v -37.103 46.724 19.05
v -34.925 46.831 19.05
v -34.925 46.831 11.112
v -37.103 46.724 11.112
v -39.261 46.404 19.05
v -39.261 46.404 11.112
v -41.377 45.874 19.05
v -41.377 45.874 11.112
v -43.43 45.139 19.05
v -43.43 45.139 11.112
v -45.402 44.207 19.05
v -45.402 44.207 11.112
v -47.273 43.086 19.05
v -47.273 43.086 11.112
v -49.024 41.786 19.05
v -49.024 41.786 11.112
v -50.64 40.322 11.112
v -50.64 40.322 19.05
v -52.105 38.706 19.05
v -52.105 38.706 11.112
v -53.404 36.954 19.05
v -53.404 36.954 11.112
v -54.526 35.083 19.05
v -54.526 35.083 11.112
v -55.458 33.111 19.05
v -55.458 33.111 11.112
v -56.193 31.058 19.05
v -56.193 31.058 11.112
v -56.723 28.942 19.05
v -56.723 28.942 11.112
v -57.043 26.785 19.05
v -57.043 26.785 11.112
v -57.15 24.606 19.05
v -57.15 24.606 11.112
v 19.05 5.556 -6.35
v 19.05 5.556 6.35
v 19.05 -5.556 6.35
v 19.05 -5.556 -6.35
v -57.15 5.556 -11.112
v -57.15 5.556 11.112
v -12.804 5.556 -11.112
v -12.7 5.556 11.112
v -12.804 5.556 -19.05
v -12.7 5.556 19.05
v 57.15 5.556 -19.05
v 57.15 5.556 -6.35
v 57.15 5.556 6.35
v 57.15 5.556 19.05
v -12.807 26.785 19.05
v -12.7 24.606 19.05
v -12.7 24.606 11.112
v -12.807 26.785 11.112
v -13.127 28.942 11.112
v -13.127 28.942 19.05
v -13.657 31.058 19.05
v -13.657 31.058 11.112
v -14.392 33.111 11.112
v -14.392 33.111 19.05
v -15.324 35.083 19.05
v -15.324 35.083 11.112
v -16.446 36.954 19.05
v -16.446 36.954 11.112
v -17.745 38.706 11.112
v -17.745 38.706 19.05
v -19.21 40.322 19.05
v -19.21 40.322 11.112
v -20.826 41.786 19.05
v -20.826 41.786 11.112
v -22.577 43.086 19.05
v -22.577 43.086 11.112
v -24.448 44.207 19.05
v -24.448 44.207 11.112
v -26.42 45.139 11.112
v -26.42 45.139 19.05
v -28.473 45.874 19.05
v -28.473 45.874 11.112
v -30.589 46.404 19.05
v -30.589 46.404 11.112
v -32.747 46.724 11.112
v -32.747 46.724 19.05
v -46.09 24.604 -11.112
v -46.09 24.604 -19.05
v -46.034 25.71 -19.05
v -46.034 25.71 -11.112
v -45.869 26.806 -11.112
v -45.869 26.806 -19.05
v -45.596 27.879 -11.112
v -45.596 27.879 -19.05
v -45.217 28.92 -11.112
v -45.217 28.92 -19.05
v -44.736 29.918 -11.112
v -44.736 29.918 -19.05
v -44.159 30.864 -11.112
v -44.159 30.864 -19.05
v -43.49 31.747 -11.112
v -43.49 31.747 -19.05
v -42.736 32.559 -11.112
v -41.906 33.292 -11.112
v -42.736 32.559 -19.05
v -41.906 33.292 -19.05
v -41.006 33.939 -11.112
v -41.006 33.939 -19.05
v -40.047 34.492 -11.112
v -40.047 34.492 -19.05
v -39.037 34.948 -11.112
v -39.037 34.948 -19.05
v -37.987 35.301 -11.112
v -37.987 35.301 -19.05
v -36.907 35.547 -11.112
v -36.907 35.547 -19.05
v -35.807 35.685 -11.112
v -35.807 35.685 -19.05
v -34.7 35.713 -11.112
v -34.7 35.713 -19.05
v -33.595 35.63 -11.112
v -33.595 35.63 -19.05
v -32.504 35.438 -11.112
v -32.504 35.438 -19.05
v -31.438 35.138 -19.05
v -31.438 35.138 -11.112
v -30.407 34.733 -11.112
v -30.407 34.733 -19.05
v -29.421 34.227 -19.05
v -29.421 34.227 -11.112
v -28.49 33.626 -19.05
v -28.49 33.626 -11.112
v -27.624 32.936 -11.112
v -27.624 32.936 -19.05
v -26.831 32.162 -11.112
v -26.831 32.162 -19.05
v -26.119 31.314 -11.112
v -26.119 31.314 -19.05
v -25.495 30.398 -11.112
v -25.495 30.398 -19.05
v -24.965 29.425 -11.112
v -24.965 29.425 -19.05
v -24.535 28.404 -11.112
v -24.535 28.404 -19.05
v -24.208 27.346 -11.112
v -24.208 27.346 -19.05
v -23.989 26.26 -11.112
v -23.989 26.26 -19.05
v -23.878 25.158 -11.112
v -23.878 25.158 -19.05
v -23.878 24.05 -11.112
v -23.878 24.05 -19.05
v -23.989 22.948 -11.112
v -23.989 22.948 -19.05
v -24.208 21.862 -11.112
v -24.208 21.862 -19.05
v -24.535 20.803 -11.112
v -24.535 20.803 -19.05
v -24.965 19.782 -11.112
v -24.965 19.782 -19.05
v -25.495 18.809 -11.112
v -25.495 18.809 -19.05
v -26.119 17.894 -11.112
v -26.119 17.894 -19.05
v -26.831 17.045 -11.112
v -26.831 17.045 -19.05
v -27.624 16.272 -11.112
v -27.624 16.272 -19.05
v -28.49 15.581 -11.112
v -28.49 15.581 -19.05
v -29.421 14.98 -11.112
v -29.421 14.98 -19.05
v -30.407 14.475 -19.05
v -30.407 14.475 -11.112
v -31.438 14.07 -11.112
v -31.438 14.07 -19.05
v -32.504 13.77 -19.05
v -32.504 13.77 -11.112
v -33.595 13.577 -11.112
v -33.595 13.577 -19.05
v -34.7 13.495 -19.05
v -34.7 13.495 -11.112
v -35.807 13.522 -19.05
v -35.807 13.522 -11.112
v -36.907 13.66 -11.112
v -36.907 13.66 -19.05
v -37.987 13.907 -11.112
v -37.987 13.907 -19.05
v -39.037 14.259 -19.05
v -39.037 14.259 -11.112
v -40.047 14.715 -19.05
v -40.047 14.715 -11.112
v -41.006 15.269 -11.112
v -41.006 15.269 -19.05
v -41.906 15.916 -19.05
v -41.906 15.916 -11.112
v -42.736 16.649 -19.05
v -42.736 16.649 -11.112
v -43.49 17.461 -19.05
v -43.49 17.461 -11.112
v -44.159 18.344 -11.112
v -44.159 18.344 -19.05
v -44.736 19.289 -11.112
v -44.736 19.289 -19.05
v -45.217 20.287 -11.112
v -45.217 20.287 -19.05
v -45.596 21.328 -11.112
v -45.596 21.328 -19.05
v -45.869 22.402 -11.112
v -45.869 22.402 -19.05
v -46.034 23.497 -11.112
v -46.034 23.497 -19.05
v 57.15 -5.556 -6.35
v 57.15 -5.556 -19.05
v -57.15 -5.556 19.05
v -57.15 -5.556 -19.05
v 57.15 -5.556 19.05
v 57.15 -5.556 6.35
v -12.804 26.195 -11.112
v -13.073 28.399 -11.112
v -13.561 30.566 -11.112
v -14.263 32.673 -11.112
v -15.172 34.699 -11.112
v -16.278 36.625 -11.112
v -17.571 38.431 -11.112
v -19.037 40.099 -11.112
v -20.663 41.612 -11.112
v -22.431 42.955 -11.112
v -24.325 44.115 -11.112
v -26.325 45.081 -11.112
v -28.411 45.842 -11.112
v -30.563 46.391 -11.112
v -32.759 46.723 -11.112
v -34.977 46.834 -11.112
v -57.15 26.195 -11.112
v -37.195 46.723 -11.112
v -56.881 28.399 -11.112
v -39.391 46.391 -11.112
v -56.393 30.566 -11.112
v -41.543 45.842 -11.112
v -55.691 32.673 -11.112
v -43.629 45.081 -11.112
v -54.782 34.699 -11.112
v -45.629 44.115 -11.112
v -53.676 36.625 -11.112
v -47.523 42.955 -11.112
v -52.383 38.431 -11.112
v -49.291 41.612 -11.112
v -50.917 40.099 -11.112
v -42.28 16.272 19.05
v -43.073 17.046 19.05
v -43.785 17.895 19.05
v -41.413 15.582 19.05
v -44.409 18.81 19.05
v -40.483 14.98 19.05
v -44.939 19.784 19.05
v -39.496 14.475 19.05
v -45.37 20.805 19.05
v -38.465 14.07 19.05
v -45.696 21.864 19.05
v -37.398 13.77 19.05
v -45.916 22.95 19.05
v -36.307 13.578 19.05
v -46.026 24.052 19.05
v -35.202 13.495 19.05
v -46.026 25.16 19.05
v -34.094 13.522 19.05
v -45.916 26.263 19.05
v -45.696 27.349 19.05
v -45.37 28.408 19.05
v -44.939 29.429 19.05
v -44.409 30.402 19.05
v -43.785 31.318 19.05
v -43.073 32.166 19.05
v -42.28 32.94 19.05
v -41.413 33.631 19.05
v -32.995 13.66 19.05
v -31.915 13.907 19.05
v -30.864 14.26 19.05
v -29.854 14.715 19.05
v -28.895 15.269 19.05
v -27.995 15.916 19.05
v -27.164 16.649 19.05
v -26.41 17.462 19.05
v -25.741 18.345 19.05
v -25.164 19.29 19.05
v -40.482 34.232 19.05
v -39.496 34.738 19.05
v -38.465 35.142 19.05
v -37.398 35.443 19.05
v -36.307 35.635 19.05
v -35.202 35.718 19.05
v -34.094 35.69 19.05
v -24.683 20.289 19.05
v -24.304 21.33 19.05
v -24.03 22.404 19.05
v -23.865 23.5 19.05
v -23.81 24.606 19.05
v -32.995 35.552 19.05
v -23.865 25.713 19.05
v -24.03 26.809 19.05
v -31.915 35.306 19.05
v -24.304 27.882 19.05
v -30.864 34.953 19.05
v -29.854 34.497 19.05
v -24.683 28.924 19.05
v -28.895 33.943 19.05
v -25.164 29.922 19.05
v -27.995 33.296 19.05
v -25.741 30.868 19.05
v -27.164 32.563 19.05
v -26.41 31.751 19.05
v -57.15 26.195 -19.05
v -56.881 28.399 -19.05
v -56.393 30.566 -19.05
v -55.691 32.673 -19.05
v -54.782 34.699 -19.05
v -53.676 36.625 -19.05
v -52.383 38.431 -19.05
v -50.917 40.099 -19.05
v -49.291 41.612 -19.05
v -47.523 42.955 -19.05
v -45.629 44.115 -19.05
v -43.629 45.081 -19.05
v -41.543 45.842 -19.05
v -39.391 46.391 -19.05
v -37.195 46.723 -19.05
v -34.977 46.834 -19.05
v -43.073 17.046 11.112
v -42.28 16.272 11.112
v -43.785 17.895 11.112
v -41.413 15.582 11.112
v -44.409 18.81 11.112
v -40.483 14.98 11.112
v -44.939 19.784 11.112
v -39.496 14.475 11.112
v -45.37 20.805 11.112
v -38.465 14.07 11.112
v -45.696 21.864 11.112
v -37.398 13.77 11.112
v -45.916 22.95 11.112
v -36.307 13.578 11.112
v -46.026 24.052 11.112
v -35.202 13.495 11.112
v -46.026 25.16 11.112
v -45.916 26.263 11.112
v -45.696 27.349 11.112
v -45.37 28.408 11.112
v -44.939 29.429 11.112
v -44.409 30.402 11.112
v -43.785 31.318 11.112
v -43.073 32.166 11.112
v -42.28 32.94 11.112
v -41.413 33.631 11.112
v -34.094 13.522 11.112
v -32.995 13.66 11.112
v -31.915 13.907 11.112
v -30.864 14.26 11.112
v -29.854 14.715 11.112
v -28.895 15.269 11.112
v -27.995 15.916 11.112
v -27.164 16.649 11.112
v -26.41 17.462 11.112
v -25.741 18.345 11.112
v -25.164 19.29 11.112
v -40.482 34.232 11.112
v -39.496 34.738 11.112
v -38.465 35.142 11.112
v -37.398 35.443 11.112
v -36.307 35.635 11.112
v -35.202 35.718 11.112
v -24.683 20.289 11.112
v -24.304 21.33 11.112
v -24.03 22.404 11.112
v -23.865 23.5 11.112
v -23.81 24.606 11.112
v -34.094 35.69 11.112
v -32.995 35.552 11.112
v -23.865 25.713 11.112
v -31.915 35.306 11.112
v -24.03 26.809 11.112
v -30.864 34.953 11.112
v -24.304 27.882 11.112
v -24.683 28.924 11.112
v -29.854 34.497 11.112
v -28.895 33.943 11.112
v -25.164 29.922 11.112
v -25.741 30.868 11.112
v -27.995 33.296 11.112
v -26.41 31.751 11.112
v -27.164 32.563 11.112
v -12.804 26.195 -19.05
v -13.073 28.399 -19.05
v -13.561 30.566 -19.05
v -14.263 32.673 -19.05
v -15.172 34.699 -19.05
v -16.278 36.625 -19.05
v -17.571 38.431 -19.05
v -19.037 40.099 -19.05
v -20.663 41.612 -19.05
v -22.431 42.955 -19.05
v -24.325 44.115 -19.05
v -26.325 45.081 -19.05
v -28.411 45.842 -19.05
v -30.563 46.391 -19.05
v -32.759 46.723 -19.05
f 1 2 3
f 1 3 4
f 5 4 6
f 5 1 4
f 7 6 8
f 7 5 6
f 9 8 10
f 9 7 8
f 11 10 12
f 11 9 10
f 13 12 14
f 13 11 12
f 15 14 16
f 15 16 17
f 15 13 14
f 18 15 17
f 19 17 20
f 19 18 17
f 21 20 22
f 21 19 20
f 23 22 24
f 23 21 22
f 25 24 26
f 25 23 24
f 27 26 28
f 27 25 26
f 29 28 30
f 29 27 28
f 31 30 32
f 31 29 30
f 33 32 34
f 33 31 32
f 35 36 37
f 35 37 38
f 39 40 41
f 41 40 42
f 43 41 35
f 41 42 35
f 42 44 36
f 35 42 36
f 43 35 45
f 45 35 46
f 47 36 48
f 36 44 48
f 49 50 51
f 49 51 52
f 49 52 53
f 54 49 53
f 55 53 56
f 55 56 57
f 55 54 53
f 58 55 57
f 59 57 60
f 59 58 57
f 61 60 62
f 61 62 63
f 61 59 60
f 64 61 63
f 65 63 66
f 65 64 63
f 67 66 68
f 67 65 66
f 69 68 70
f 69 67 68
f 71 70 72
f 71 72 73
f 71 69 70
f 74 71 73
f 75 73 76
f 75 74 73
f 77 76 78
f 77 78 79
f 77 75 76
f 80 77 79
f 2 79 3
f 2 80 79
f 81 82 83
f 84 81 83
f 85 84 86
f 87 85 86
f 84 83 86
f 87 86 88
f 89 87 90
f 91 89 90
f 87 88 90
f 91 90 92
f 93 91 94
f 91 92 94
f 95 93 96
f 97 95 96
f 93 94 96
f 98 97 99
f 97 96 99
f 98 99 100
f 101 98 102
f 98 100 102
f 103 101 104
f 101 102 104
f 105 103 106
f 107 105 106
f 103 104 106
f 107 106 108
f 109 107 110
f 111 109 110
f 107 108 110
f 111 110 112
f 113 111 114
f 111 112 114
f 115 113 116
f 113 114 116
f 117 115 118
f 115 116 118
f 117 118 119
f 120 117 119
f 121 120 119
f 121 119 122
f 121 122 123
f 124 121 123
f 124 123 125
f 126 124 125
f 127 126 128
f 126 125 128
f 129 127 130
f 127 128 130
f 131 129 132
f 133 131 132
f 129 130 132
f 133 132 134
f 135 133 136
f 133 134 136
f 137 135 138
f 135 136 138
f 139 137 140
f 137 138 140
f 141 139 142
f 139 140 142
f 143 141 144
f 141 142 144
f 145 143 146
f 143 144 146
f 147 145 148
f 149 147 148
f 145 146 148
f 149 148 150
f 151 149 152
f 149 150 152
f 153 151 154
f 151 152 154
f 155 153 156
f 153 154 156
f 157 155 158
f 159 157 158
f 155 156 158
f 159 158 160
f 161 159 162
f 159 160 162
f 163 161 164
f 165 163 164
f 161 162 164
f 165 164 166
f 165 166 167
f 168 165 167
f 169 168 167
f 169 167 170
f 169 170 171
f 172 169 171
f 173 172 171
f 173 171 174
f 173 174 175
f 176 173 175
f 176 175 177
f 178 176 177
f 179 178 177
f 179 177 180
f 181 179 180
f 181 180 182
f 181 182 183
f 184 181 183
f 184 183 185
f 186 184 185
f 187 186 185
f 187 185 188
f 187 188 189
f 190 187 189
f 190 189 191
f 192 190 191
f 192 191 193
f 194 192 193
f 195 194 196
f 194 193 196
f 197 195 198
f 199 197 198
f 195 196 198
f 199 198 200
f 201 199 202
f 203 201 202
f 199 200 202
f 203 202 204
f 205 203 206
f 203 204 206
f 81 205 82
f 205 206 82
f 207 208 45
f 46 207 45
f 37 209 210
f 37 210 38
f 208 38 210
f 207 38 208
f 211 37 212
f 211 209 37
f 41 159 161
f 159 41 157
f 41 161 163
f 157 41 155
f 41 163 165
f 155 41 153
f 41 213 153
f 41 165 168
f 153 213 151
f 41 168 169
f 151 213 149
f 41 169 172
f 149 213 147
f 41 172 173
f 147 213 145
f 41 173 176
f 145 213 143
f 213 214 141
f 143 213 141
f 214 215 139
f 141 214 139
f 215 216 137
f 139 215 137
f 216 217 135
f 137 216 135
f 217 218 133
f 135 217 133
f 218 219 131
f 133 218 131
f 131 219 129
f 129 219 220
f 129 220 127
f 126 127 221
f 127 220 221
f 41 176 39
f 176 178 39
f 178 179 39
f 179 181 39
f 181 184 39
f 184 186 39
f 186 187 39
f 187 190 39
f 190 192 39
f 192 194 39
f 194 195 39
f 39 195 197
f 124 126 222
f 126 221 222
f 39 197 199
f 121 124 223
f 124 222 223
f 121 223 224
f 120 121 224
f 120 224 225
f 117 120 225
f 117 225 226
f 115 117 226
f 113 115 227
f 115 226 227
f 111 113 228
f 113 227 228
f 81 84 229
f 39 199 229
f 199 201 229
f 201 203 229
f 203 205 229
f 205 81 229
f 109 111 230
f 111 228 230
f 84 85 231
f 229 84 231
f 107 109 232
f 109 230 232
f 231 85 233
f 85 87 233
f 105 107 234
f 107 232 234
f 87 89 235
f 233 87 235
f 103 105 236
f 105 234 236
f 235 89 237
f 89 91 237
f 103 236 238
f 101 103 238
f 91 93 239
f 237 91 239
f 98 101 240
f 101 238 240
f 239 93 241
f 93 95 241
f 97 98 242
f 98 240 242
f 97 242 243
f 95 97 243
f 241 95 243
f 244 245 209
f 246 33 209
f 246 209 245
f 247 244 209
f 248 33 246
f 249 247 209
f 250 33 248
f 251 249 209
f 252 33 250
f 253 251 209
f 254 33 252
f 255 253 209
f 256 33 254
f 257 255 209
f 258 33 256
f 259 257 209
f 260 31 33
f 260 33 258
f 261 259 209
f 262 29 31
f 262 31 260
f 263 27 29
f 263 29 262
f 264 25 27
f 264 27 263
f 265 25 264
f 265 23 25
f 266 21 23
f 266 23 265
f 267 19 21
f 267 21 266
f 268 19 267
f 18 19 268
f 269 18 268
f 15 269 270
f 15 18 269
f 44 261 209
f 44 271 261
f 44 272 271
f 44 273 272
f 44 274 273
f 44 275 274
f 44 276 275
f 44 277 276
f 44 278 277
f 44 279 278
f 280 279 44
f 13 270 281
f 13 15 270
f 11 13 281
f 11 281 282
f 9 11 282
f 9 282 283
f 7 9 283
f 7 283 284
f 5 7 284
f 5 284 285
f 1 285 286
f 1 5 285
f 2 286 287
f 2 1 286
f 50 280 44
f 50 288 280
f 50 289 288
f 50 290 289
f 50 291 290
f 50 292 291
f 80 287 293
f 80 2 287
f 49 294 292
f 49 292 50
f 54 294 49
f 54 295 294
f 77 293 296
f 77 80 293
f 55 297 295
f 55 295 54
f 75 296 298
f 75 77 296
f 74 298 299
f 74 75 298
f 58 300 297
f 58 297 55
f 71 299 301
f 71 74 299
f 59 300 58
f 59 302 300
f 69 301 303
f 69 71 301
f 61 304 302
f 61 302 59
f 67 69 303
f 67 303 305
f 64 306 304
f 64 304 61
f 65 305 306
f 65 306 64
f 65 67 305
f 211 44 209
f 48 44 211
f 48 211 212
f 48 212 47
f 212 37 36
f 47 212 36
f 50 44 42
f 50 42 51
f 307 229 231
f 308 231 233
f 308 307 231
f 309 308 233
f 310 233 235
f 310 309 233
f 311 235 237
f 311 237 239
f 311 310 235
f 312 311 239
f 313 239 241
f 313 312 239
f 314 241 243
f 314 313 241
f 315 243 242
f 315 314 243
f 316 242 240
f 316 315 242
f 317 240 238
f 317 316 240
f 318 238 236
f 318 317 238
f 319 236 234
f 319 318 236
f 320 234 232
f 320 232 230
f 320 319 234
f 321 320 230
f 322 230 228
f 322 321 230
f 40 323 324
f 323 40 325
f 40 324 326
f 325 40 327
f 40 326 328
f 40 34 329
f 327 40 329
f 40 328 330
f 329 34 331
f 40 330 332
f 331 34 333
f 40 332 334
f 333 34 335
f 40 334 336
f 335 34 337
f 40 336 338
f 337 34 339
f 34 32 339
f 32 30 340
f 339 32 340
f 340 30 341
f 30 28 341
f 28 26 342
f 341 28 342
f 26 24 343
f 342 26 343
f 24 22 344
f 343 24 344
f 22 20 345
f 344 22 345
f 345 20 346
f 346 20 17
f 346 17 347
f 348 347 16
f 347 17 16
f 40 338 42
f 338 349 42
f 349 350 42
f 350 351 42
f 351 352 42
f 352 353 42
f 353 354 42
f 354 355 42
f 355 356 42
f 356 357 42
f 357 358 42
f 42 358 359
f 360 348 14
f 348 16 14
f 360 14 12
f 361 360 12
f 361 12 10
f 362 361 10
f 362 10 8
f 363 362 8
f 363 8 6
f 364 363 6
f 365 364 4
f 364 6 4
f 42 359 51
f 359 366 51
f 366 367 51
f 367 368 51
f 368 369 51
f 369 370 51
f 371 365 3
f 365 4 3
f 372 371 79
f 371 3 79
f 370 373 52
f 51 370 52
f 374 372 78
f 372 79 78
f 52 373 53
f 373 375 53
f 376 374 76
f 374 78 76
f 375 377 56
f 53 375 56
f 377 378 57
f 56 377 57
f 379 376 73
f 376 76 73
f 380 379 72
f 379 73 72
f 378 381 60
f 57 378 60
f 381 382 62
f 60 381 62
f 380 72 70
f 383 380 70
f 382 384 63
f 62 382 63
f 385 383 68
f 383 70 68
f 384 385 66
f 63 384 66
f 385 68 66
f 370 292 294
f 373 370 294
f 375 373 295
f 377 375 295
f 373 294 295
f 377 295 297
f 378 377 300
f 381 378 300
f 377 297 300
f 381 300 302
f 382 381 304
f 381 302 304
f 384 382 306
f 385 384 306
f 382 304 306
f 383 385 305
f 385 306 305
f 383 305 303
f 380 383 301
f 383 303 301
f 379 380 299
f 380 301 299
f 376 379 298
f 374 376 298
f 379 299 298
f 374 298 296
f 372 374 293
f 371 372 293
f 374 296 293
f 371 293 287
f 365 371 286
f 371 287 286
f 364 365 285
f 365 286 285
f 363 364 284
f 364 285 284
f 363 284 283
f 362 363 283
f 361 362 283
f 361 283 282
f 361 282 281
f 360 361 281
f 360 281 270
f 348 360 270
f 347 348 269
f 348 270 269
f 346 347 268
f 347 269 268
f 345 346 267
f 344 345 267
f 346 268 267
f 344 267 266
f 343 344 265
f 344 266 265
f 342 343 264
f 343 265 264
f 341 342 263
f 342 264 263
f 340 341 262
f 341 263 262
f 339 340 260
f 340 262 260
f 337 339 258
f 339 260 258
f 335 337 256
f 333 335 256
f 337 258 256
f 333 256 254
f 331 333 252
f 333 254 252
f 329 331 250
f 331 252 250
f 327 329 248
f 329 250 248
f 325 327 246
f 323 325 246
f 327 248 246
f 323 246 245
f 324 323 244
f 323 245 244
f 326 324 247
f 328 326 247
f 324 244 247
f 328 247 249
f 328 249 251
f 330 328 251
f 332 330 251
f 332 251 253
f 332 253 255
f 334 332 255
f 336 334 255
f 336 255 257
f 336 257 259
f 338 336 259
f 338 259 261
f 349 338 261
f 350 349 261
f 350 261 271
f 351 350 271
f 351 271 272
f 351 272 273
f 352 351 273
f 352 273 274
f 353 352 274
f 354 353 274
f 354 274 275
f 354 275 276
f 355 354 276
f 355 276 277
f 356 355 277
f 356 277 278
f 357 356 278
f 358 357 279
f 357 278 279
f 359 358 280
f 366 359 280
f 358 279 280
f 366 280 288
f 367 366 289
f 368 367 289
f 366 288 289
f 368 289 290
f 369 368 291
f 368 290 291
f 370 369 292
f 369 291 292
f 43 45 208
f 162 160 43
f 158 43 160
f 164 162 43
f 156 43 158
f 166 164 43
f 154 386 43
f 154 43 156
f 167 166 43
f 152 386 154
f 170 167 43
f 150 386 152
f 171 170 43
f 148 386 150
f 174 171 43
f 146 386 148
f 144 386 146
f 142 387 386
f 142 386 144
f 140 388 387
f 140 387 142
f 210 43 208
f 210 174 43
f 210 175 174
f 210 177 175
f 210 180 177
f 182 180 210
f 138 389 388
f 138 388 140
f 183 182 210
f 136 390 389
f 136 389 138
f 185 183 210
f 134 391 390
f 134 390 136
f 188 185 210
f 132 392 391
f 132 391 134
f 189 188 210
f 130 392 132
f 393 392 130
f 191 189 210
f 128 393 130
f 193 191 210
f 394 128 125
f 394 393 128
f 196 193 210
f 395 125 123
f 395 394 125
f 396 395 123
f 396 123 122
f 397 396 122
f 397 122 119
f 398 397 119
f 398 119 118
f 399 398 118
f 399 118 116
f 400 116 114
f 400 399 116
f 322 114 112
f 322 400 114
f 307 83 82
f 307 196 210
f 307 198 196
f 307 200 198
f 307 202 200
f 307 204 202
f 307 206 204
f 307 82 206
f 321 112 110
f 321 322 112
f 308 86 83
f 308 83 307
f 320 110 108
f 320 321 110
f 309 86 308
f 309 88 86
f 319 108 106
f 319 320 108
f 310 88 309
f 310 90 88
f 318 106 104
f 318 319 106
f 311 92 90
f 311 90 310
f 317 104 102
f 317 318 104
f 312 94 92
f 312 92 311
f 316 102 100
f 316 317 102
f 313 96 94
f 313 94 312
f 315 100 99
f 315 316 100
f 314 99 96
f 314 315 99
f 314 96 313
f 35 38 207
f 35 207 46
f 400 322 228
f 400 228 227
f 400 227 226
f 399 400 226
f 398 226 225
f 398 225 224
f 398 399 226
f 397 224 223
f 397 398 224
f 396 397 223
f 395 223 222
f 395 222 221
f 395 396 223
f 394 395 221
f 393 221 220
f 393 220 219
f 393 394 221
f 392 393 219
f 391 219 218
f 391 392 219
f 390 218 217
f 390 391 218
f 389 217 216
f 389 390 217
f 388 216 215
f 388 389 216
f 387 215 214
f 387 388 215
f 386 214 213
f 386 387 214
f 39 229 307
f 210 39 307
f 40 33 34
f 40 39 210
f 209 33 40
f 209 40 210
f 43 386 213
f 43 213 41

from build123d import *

# Parameters (mm, degrees)
SKETCH1_W           = 114.3
SKETCH1_H           = 11.1125
BOSS_EXTRUDE1_DEPTH = 19.05
SKETCH3_W           = 12.7
SKETCH3_H           = 11.1125
CUT_EXTRUDE1_DEPTH  = 38.1
SKETCH4_R           = 11.115
BOSS_EXTRUDE2_DEPTH = 7.9375
SKETCH5_R           = 11.1125
BOSS_EXTRUDE3_DEPTH = 7.9375


with BuildPart() as part:
    # Sketch1 → Boss-Extrude1 (new, symmetric)
    with BuildSketch(Plane.XY):
        Rectangle(SKETCH1_W, SKETCH1_H)
    extrude(amount=BOSS_EXTRUDE1_DEPTH, both=True)

    # Sketch3 → Cut-Extrude1 (cut)
    with BuildSketch(Plane(origin=(57.15, 0, 0), x_dir=(0, 0, -1), z_dir=(1, 0, 0))):
        Rectangle(SKETCH3_W, SKETCH3_H)
    extrude(amount=-CUT_EXTRUDE1_DEPTH, mode=Mode.SUBTRACT)

    # Sketch4 → Boss-Extrude2 (add)
    with BuildSketch(Plane.XY.offset(19.05)):
        with BuildLine():
            Line((-57.15, 24.60625), (-57.15, 5.55625))
            Line((-57.15, 5.55625), (-12.7, 5.55625))
            Line((-12.7, 5.55625), (-12.7, 24.60625))
            ThreePointArc((-12.7, 24.60625), (-19.209551788, 40.321698212), (-34.925, 46.83125))
            ThreePointArc((-34.925, 46.83125), (-50.640448212, 40.321698212), (-57.15, 24.60625))
        make_face()
        with Locations((-34.925, 24.60625)):
            Circle(SKETCH4_R, mode=Mode.SUBTRACT)
    extrude(amount=-BOSS_EXTRUDE2_DEPTH)

    # Sketch5 → Boss-Extrude3 (add)
    with BuildSketch(Plane(origin=(0, 0, -19.05), x_dir=(-1, 0, 0), z_dir=(0, 0, -1))):
        with BuildLine():
            Line((12.804049861, 5.55625), (57.15, 5.55625))
            Line((57.15, 5.55625), (57.15, 26.195))
            ThreePointArc((57.15, 26.195), (50.122971728, 40.875602864), (34.977024762, 46.83375))
            ThreePointArc((34.977024762, 46.83375), (19.83107801, 40.875602749), (12.804049861, 26.195))
            Line((12.804049861, 26.195), (12.804049861, 5.55625))
        make_face()
        with Locations((34.97702493, 24.60375)):
            Circle(SKETCH5_R, mode=Mode.SUBTRACT)
    extrude(amount=-BOSS_EXTRUDE3_DEPTH)


solid = part.part
